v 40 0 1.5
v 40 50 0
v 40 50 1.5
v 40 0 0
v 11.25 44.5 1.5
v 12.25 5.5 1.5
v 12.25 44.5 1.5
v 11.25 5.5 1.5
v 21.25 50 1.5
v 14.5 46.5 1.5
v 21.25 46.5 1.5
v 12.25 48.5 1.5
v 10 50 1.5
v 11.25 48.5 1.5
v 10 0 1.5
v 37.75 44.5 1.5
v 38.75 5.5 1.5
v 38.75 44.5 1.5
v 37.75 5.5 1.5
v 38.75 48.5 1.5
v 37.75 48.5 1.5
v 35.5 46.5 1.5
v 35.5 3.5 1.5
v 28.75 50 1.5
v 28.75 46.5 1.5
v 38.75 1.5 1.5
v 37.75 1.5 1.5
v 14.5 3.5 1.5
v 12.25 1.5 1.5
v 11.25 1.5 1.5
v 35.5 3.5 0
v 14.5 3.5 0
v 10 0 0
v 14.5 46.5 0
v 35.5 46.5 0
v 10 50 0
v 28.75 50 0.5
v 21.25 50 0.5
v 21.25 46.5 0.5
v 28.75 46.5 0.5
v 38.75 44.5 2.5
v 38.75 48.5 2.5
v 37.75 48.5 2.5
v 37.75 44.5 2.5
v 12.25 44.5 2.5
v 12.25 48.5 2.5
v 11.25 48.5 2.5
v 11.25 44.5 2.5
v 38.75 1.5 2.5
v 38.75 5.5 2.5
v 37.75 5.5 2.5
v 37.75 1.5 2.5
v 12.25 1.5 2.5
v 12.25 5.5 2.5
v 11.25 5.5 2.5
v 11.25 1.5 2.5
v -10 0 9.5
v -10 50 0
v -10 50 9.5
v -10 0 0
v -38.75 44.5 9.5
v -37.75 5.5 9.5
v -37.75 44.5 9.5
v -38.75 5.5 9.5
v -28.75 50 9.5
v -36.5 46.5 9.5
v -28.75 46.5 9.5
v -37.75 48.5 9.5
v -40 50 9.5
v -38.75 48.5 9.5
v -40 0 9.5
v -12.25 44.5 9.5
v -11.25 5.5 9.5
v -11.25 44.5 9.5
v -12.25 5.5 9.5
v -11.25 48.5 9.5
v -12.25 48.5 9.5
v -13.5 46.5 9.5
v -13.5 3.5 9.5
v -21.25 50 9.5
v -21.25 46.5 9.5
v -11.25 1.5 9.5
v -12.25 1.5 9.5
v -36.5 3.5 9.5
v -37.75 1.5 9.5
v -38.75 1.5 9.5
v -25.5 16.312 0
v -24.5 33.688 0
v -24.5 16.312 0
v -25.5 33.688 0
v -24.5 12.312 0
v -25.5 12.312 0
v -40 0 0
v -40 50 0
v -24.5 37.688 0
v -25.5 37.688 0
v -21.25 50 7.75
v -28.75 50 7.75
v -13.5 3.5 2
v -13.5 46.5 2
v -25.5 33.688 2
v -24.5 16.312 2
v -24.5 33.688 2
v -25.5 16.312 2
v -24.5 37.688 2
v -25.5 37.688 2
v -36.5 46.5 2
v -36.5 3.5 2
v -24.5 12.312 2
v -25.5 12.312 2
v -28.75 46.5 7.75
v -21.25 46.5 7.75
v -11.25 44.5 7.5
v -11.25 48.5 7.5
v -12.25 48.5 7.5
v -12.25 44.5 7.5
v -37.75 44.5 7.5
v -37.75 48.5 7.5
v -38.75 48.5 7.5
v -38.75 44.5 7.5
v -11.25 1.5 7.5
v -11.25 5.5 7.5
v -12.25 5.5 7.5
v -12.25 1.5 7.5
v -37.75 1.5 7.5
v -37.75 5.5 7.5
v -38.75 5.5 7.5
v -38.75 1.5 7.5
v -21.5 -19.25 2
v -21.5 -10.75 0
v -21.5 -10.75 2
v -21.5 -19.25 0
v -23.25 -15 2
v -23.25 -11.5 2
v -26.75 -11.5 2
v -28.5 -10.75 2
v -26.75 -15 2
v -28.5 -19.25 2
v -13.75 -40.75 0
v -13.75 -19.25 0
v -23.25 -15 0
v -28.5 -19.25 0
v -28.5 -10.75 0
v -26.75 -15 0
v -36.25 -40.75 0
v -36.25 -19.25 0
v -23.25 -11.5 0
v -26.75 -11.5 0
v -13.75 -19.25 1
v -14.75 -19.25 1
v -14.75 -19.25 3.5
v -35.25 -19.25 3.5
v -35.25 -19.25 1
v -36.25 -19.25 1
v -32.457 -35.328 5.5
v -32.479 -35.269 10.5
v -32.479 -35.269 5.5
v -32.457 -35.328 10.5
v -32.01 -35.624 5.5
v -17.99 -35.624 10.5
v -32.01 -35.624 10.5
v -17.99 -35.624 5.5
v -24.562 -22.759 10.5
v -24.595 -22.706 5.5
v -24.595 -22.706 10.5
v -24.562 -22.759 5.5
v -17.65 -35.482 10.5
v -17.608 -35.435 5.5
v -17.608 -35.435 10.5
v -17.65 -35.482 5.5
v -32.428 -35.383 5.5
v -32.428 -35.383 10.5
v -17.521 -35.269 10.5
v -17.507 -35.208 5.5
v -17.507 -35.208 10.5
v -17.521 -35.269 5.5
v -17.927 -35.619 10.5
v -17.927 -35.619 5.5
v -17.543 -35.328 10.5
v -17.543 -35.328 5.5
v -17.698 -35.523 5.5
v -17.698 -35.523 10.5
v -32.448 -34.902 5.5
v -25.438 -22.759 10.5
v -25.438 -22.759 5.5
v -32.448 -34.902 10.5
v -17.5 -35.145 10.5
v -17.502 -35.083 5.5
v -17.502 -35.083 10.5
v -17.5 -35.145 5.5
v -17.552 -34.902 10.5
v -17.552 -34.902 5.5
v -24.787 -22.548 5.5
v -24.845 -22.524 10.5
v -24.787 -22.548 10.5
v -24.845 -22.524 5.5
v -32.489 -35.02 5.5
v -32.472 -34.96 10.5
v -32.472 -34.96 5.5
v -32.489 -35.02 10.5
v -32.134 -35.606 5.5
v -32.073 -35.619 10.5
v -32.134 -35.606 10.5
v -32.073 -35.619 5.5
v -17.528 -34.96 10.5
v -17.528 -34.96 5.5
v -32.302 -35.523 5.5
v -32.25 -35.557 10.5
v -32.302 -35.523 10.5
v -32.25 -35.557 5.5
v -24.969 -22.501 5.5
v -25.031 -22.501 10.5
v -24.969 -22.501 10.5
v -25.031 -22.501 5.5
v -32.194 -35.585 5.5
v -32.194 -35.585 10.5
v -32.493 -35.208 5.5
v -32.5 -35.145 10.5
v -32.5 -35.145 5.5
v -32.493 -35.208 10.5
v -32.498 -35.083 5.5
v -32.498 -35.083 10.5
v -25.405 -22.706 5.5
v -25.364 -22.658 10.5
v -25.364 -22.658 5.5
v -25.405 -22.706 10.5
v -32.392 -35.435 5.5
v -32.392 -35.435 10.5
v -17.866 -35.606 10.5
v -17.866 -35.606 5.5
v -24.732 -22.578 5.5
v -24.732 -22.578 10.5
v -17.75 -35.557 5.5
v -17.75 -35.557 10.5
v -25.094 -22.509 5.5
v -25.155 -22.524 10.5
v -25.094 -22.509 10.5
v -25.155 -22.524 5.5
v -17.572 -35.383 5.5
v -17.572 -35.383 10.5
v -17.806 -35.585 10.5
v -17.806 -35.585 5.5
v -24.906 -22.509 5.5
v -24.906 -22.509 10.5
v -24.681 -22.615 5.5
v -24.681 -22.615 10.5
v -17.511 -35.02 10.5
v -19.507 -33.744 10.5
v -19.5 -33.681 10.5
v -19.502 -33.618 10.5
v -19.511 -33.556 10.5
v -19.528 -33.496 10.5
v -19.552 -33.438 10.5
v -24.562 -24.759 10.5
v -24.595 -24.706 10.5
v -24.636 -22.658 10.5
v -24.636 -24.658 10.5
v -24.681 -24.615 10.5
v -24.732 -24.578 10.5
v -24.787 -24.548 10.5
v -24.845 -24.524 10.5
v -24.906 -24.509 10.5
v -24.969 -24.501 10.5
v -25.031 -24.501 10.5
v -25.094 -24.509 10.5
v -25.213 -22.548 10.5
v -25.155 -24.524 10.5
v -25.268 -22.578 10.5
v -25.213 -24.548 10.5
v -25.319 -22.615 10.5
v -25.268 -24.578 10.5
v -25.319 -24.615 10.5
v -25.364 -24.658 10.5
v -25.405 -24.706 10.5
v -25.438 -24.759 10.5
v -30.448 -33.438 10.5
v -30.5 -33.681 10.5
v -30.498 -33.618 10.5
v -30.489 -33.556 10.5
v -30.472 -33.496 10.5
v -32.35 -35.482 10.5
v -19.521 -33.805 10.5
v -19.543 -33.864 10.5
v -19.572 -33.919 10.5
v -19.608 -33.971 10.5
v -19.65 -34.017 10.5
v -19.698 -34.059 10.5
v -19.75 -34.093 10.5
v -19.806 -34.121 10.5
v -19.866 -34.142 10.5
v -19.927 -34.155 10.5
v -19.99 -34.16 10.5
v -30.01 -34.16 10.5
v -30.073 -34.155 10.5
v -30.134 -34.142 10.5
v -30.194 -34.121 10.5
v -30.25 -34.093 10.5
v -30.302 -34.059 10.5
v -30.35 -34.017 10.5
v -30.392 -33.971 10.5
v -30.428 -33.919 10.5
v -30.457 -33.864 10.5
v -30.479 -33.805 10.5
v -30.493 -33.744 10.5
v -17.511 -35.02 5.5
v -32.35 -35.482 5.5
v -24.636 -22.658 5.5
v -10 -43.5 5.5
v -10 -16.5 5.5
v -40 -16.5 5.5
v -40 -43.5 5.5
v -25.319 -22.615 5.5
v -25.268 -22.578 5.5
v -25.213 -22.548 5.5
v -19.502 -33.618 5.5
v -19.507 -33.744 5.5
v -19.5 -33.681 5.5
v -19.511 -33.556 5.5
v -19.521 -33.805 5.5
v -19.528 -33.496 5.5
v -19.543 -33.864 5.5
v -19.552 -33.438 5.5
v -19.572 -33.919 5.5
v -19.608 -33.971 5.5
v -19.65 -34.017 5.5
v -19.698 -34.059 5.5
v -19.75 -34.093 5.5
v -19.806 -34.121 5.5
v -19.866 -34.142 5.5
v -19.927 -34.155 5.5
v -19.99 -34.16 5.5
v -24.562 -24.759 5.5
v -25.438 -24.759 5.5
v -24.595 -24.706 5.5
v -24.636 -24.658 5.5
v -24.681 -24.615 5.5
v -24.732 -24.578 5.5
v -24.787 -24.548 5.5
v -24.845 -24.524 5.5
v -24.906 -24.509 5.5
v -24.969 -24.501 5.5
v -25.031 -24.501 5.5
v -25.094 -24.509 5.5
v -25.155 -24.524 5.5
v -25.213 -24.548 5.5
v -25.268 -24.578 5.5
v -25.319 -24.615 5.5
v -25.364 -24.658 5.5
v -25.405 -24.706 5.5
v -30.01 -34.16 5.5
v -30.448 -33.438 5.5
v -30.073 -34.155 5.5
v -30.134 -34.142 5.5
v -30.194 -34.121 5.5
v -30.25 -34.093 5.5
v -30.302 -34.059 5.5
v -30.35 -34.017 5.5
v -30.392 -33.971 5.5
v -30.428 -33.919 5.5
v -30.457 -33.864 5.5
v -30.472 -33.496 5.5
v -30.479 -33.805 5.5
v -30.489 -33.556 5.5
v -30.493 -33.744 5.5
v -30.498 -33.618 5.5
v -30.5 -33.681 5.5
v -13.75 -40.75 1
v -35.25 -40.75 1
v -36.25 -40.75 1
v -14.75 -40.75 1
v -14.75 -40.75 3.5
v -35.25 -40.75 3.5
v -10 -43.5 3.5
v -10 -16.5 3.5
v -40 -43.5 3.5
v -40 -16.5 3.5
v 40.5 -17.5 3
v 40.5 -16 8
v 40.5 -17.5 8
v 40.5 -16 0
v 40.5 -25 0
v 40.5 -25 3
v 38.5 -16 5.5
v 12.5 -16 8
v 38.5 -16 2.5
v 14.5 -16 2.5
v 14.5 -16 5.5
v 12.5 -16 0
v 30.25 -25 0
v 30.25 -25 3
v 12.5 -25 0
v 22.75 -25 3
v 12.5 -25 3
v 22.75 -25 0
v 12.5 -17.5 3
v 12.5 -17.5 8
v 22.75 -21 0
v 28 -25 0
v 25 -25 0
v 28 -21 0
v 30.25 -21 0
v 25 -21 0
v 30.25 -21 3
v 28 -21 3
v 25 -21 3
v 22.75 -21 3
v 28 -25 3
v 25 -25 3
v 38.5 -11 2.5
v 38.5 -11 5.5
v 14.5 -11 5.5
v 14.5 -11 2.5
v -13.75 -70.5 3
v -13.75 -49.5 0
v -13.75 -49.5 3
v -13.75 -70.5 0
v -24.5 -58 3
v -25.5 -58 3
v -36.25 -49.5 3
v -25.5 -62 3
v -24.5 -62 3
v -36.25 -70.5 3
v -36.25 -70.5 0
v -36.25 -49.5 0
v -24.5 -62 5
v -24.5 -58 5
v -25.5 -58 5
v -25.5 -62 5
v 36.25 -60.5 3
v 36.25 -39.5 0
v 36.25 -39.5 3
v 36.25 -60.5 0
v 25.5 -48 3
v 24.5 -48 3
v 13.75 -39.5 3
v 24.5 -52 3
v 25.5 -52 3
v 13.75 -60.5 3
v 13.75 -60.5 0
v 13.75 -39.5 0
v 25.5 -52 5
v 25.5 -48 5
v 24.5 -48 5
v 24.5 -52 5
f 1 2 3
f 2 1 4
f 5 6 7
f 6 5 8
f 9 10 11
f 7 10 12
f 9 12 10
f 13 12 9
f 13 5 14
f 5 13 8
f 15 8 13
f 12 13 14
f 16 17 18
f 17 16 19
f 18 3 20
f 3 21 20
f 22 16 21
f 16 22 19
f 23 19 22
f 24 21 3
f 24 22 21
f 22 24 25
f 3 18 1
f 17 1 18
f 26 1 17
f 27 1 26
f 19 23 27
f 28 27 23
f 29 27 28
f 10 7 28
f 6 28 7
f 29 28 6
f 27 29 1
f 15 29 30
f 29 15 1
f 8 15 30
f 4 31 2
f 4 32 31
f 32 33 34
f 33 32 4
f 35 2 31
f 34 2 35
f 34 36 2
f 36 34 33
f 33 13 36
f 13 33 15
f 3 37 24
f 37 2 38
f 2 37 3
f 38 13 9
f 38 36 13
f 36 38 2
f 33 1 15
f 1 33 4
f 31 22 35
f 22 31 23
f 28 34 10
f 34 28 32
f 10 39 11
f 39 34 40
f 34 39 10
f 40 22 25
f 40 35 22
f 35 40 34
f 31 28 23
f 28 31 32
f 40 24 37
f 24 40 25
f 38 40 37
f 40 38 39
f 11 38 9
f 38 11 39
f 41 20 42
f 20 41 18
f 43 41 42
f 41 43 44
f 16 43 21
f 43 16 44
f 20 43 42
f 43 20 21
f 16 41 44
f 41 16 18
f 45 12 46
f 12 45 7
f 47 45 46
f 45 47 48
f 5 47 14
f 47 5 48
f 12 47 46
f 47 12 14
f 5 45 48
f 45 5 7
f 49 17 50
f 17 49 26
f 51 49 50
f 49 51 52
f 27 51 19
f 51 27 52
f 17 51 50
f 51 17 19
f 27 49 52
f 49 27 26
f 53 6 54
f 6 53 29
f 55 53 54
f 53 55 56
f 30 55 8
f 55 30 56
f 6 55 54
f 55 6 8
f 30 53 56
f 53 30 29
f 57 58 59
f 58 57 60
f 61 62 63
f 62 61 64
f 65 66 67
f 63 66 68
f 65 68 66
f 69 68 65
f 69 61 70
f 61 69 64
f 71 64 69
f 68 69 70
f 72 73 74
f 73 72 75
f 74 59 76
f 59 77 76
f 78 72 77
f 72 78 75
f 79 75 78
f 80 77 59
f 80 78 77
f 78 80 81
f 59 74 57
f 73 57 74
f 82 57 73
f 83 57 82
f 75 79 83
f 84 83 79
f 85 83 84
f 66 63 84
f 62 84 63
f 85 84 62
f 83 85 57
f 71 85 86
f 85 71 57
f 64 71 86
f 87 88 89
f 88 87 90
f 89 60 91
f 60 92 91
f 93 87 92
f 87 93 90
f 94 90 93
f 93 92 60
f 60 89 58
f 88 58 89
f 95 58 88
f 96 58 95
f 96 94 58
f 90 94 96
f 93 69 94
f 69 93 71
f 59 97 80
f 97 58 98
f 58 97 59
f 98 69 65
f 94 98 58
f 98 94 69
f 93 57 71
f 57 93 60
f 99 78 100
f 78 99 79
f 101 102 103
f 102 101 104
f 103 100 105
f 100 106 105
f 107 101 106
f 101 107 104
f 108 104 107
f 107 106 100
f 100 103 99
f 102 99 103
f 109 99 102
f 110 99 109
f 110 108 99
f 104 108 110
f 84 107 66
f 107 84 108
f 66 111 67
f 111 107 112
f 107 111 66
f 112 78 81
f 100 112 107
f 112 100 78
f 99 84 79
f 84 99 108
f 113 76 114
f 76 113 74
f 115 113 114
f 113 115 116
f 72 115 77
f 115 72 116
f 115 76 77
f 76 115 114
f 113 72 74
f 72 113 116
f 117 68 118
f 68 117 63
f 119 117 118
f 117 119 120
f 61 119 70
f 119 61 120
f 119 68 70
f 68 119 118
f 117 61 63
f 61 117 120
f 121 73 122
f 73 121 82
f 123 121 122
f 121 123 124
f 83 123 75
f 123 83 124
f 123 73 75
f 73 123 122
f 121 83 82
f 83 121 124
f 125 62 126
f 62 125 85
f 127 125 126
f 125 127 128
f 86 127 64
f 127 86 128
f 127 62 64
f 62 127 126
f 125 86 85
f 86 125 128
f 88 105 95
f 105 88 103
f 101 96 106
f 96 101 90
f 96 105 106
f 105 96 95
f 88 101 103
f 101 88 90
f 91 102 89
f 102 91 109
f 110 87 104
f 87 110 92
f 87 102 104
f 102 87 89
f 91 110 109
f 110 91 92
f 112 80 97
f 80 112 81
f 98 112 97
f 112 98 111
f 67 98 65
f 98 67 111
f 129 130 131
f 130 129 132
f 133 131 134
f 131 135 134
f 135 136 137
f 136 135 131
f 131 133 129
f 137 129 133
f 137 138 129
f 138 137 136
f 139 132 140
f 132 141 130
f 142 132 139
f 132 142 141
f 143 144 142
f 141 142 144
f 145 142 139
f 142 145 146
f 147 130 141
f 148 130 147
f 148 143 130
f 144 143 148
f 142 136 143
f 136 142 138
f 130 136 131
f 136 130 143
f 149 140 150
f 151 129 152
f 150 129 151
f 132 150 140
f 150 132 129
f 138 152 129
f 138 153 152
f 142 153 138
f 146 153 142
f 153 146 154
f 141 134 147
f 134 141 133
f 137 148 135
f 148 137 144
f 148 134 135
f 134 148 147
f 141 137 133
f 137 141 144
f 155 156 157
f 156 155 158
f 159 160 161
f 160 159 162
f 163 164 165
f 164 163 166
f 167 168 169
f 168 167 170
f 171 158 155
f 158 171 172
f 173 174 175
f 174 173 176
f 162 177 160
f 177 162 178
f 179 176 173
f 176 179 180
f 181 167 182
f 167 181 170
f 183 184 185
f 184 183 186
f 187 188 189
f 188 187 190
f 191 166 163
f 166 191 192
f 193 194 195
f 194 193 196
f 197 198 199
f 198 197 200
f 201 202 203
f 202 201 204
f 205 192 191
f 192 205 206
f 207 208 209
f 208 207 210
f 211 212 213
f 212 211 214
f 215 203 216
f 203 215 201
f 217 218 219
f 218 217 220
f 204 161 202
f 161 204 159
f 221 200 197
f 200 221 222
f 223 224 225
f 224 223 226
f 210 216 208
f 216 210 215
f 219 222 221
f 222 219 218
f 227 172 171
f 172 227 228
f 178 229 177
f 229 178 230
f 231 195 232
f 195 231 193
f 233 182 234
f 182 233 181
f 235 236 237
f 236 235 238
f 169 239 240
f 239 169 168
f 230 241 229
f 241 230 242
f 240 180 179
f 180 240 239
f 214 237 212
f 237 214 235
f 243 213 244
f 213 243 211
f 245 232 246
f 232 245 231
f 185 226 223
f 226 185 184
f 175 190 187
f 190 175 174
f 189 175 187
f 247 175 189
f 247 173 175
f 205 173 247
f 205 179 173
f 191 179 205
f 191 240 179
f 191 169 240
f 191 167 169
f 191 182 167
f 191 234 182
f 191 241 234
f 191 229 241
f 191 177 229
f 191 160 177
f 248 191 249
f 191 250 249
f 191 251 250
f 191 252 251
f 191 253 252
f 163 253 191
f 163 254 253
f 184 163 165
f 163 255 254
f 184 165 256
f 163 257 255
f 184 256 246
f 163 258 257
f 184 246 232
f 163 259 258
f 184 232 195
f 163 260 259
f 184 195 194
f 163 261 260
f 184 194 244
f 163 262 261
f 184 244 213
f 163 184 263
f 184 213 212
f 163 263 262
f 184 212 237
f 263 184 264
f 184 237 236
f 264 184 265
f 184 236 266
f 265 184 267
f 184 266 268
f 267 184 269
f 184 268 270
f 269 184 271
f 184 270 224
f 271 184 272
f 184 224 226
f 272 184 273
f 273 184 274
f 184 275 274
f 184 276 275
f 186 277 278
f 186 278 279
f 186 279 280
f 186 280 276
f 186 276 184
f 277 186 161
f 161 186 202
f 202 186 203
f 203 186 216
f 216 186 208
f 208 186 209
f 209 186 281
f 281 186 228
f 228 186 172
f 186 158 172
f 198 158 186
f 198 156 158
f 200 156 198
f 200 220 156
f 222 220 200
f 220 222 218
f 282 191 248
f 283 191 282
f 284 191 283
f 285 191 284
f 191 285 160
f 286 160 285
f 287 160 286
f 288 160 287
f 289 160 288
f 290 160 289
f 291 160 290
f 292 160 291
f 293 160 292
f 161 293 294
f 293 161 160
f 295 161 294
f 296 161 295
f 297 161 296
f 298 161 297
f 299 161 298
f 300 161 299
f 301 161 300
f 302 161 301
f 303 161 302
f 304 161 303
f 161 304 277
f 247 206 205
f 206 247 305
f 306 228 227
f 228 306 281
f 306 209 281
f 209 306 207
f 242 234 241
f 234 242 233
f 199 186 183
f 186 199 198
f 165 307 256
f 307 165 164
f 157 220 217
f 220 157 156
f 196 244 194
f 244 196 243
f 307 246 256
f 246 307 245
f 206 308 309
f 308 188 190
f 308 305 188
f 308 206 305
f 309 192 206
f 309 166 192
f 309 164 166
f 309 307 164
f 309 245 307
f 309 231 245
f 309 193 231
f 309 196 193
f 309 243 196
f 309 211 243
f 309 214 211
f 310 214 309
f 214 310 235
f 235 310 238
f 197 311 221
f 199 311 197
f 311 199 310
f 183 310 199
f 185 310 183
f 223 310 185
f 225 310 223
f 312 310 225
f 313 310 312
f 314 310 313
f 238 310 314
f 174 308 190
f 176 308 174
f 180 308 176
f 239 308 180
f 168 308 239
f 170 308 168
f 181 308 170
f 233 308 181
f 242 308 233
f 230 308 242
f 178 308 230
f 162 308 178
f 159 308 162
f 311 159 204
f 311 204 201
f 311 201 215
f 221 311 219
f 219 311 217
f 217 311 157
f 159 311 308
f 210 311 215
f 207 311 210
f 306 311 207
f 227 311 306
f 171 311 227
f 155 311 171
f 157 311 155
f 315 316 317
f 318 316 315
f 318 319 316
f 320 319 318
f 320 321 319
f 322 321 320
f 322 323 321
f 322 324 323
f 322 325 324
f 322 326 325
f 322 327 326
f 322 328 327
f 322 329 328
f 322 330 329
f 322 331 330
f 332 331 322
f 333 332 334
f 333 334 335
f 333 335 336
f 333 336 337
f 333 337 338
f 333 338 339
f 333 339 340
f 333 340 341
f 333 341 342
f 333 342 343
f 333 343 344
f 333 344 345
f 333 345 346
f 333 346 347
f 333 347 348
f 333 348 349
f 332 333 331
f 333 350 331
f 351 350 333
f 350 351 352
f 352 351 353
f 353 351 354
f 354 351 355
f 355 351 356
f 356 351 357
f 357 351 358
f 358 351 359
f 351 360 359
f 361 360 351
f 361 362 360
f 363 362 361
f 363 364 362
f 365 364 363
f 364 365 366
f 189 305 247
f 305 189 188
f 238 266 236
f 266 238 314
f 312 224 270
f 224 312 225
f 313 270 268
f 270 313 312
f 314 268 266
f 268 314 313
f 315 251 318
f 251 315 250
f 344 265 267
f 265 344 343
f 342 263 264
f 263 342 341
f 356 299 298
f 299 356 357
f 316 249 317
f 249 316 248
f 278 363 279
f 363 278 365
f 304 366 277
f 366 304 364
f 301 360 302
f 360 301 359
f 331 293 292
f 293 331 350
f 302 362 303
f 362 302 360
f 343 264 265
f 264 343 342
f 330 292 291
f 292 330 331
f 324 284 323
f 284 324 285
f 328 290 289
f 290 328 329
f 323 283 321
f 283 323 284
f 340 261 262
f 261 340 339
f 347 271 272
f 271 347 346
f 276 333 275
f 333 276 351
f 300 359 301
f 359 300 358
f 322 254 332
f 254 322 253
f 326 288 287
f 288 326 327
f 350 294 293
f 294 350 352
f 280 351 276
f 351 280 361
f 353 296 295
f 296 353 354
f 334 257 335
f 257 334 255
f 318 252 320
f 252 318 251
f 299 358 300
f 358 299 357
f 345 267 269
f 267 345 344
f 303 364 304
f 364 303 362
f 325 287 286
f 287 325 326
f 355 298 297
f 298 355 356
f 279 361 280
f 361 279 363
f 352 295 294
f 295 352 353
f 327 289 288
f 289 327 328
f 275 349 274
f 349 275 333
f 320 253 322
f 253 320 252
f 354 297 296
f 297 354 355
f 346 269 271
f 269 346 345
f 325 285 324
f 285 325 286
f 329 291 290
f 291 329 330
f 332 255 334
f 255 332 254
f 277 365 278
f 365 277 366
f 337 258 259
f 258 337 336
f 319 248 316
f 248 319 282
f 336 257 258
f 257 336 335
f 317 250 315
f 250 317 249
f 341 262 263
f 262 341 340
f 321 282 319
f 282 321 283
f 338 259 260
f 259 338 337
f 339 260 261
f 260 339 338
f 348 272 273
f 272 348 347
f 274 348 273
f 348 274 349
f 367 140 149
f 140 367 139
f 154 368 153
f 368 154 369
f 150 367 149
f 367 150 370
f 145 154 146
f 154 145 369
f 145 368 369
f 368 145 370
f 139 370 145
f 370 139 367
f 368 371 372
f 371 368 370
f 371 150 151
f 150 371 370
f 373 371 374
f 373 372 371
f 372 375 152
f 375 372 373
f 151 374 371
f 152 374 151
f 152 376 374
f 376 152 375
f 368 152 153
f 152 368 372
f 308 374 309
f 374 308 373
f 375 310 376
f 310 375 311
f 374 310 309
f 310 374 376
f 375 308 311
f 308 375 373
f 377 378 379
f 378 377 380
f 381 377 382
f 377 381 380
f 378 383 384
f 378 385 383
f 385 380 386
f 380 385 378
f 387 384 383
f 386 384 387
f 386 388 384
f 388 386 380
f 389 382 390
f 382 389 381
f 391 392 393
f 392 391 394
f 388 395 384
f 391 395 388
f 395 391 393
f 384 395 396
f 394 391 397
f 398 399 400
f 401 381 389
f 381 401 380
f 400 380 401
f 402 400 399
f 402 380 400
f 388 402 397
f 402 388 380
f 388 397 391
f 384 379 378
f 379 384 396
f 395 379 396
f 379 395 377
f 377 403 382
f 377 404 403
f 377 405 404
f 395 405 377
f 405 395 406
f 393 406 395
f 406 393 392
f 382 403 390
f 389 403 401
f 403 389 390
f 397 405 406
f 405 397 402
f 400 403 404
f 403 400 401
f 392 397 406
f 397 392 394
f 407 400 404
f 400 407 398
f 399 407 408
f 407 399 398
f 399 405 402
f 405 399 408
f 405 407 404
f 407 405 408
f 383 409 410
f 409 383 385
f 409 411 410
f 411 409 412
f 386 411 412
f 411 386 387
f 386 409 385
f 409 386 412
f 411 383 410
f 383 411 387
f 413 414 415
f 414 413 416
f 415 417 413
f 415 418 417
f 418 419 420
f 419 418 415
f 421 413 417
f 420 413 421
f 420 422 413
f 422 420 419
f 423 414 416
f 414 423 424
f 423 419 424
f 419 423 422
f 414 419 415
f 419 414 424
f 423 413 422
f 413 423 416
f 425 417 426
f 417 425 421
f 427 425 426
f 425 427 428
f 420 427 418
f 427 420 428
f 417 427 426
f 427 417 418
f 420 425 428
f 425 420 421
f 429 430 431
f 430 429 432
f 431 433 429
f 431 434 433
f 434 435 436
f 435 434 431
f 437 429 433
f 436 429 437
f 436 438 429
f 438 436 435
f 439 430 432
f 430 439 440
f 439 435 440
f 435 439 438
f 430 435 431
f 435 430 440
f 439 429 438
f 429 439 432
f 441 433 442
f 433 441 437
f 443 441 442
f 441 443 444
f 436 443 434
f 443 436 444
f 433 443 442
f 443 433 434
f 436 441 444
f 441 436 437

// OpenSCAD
$fn = 50;// number of fragments

//general specifications
signal_width = 30;
signal_depth = 50;
signal_height = 11;
magent_d = 5;
magnet_height = 3;

//cover specifications
cover_height = 1.5;
frame_width = 4.5;
frame_overhang = 1;

//body specification
body_height = signal_height-cover_height;
wall_thickness = frame_width-frame_overhang; //if the wall has to be thicker, the frame has to become thicker too
ground_thickness = 2;
cavity_width = signal_width-2*wall_thickness;
cavity_depth = signal_depth-2*wall_thickness;
cavity_height = body_height-ground_thickness;
lock_passage_y = (signal_depth-wall_thickness)/2;

//control specifications
move_tolerance = 0.5;
bottom_width = cavity_width-move_tolerance;
bottom_depth = cavity_depth/2;
bottom_h = 1;
groove_width = signal_width-2*frame_width-move_tolerance;
//groove_depth = (signal_depth/2)-2*frame_width-move_tolerance;
groove_h = cover_height+1; //higher, because the print support remains a bit
top_width = signal_width;
top_depth = (signal_depth/2)+2*frame_overhang;
top_h = 2;
lock_width = 7;
lock_depth = wall_thickness+5;
lock_heigth = 2; // has to be < bottom_h+cover_height
lockpin_d = 3;

//connecting pins specification
pin_width = 1;
pin_depth = 4;
pin_height = 2;
hole_tolerance = 0.2;

pinA_x = (signal_width-wall_thickness)/2; //wall_thicknes has to be >= 3.5mm
pinA_y = ((signal_depth/2)-wall_thickness);
pin_z = (cover_height/2);
pin_hole_z = (body_height-pin_height)/2;

//stopper specification
stopper_top_thickness = 1.5;
stopper_side_thickness = lockpin_d;
stopper_overhang = 2;
stopper_width = signal_width-2;
stopper_depth = 5+stopper_side_thickness;
stopper_height = bottom_h+groove_h+top_h+stopper_top_thickness+stopper_overhang;

//color block specification
c_block_width = cavity_width-move_tolerance;
c_block_depth = cavity_depth/2 - move_tolerance;
c_block_height = cavity_height-bottom_h-groove_h-2*move_tolerance; // has to be < cavity_height-bottom_h-groove_h-2*move_tolerance

module equ_triangle(side_length,corner_radius,triangle_height){
    // copy from https://www.youtube.com/watch?v=5hDB8Nsd688
    translate([0,corner_radius]){
    hull(){
        cylinder(r=corner_radius,h=triangle_height);
     rotate([0,0,60])translate([side_length-corner_radius*2,0,0])cylinder(r=corner_radius,h=triangle_height);   
         rotate([0,0,120])translate([side_length-corner_radius*2,0,0])cylinder(r=corner_radius,h=triangle_height);
        };
};
};

module pin(){
    cube([pin_width, pin_depth, pin_height], center = true);
//    if (hole==true){
//        cube([pin_width+hole_tolerance, pin_depth+hole_tolerance, pin_height+hole_tolerance],center = true);
//    };
};




module cover(){
    union(){
        difference(){
            cube([signal_width, signal_depth, cover_height], center = true);
            cube([signal_width-2*frame_width, cavity_depth, cover_height], center = true);
            //lock passage
            translate([0,lock_passage_y,(cover_height-(lock_heigth-bottom_h))/2])cube([lock_width+move_tolerance,wall_thickness,lock_heigth-bottom_h], center=true);
        };
        translate([pinA_x,pinA_y,pin_z]) pin();
        translate([-pinA_x,pinA_y,pin_z]) pin();
        translate([pinA_x,-pinA_y,pin_z]) pin();
        translate([-pinA_x,-pinA_y,pin_z]) pin();
    };
    
};

module body(){
    difference(){
        union(){
            difference(){
                cube([signal_width, signal_depth, body_height], center=true);
                translate([0,0,ground_thickness/2]) cube([cavity_width, cavity_depth, cavity_height], center    =true);
            };
        };
        translate([pinA_x,pinA_y,pin_hole_z]) pin();
        translate([-pinA_x,pinA_y,pin_hole_z]) pin();
        translate([pinA_x,-pinA_y,pin_hole_z]) pin();
        translate([-pinA_x,-pinA_y,pin_hole_z]) pin();
        // color block pin
        translate([0,(cavity_depth-move_tolerance/2)/4, -pin_hole_z]) pin();
        translate([0,-(cavity_depth-move_tolerance/2)/4, -pin_hole_z]) pin();
        //lock passage
        translate([0,lock_passage_y,(body_height-(bottom_h+move_tolerance))/2]) cube([lock_width+move_tolerance,wall_thickness,bottom_h+2*move_tolerance], center=true);
    };
};


module control(type){
    side_length = signal_depth/2-10;
    //bottom
    translate([0,0,bottom_h/2]) cube([bottom_width, bottom_depth, bottom_h], center=true);
    //lock
    difference(){
        translate([0,(bottom_depth+lock_depth)/2,lock_heigth/2]) cube([lock_width, lock_depth, lock_heigth],center=true);
        translate([0,bottom_depth/2+wall_thickness+lockpin_d/2+1,lock_heigth/2]) cube([lockpin_d+move_tolerance, lockpin_d+move_tolerance, lock_heigth],center=true);
    };
    //groove
    translate([0,0,bottom_h+(groove_h/2)]) cube([groove_width, bottom_depth, groove_h], center=true);
    //top
    translate([0,0,bottom_h+groove_h+(top_h/2)]) cube([top_width, top_depth, top_h], center=true);
    //handle
    //translate([0,0,bottom_h+groove_h+top_h+5]) cube([signal_width-8, 3, 10], center=true);
    if(type=="main"){
        translate([0,0,bottom_h+groove_h+top_h+2.5]) difference(){
          cube([side_length, side_length, 5], center=true);
          cube([side_length-4, side_length-4, 5], center=true);  
      }; 
    };
    if(type=="distant"){
        difference(){    
          rotate([0,0,180]) translate([0,-side_length/2,bottom_h+groove_h+top_h]) equ_triangle(side_length, 0.5, 5);
          rotate([0,0,180]) translate([0,-(side_length-4)/2,bottom_h+groove_h+top_h]) equ_triangle(side_length-4, 0.5, 5);
        };
    };
};


module stopper(){
    difference(){
        cube([stopper_width,stopper_depth,stopper_height]);
        cube([stopper_width,stopper_depth-stopper_side_thickness, stopper_height-stopper_top_thickness]);
        translate([(stopper_width-(lock_width+move_tolerance))/2,stopper_depth-stopper_side_thickness,0]) cube([lock_width+move_tolerance, stopper_side_thickness, lock_heigth+stopper_overhang]);//
    };
    //pin
    translate([stopper_width/2, stopper_depth-lockpin_d/2, (lock_heigth+stopper_overhang)/2]) cube([lockpin_d, lockpin_d, lock_heigth+stopper_overhang], center=true);
    //handle
    translate([2,(stopper_depth-3)/2,stopper_height]) cube([stopper_width-4, 3, 5]);
};


module color_block(){
    cube([c_block_width, c_block_depth, c_block_height], center=true);
    translate([0,0,(c_block_height+pin_height)/2]) pin();
    
};
//color_block();
//control("distant");
//cover();
//display objects
position = 25;
translate([position, position, cover_height/2]) cover();
translate([-position, position, body_height/2]) body();
translate([-position,-position-5,0]) control("distant"); //translate Z=bottom_h+groove_h+top_h
translate([position/2, -position,stopper_depth]) rotate([-90,0,0]) stopper();
translate([-position, -2*position-10,c_block_height/2]) color_block();
translate([position, -2*position,c_block_height/2]) color_block();



    
